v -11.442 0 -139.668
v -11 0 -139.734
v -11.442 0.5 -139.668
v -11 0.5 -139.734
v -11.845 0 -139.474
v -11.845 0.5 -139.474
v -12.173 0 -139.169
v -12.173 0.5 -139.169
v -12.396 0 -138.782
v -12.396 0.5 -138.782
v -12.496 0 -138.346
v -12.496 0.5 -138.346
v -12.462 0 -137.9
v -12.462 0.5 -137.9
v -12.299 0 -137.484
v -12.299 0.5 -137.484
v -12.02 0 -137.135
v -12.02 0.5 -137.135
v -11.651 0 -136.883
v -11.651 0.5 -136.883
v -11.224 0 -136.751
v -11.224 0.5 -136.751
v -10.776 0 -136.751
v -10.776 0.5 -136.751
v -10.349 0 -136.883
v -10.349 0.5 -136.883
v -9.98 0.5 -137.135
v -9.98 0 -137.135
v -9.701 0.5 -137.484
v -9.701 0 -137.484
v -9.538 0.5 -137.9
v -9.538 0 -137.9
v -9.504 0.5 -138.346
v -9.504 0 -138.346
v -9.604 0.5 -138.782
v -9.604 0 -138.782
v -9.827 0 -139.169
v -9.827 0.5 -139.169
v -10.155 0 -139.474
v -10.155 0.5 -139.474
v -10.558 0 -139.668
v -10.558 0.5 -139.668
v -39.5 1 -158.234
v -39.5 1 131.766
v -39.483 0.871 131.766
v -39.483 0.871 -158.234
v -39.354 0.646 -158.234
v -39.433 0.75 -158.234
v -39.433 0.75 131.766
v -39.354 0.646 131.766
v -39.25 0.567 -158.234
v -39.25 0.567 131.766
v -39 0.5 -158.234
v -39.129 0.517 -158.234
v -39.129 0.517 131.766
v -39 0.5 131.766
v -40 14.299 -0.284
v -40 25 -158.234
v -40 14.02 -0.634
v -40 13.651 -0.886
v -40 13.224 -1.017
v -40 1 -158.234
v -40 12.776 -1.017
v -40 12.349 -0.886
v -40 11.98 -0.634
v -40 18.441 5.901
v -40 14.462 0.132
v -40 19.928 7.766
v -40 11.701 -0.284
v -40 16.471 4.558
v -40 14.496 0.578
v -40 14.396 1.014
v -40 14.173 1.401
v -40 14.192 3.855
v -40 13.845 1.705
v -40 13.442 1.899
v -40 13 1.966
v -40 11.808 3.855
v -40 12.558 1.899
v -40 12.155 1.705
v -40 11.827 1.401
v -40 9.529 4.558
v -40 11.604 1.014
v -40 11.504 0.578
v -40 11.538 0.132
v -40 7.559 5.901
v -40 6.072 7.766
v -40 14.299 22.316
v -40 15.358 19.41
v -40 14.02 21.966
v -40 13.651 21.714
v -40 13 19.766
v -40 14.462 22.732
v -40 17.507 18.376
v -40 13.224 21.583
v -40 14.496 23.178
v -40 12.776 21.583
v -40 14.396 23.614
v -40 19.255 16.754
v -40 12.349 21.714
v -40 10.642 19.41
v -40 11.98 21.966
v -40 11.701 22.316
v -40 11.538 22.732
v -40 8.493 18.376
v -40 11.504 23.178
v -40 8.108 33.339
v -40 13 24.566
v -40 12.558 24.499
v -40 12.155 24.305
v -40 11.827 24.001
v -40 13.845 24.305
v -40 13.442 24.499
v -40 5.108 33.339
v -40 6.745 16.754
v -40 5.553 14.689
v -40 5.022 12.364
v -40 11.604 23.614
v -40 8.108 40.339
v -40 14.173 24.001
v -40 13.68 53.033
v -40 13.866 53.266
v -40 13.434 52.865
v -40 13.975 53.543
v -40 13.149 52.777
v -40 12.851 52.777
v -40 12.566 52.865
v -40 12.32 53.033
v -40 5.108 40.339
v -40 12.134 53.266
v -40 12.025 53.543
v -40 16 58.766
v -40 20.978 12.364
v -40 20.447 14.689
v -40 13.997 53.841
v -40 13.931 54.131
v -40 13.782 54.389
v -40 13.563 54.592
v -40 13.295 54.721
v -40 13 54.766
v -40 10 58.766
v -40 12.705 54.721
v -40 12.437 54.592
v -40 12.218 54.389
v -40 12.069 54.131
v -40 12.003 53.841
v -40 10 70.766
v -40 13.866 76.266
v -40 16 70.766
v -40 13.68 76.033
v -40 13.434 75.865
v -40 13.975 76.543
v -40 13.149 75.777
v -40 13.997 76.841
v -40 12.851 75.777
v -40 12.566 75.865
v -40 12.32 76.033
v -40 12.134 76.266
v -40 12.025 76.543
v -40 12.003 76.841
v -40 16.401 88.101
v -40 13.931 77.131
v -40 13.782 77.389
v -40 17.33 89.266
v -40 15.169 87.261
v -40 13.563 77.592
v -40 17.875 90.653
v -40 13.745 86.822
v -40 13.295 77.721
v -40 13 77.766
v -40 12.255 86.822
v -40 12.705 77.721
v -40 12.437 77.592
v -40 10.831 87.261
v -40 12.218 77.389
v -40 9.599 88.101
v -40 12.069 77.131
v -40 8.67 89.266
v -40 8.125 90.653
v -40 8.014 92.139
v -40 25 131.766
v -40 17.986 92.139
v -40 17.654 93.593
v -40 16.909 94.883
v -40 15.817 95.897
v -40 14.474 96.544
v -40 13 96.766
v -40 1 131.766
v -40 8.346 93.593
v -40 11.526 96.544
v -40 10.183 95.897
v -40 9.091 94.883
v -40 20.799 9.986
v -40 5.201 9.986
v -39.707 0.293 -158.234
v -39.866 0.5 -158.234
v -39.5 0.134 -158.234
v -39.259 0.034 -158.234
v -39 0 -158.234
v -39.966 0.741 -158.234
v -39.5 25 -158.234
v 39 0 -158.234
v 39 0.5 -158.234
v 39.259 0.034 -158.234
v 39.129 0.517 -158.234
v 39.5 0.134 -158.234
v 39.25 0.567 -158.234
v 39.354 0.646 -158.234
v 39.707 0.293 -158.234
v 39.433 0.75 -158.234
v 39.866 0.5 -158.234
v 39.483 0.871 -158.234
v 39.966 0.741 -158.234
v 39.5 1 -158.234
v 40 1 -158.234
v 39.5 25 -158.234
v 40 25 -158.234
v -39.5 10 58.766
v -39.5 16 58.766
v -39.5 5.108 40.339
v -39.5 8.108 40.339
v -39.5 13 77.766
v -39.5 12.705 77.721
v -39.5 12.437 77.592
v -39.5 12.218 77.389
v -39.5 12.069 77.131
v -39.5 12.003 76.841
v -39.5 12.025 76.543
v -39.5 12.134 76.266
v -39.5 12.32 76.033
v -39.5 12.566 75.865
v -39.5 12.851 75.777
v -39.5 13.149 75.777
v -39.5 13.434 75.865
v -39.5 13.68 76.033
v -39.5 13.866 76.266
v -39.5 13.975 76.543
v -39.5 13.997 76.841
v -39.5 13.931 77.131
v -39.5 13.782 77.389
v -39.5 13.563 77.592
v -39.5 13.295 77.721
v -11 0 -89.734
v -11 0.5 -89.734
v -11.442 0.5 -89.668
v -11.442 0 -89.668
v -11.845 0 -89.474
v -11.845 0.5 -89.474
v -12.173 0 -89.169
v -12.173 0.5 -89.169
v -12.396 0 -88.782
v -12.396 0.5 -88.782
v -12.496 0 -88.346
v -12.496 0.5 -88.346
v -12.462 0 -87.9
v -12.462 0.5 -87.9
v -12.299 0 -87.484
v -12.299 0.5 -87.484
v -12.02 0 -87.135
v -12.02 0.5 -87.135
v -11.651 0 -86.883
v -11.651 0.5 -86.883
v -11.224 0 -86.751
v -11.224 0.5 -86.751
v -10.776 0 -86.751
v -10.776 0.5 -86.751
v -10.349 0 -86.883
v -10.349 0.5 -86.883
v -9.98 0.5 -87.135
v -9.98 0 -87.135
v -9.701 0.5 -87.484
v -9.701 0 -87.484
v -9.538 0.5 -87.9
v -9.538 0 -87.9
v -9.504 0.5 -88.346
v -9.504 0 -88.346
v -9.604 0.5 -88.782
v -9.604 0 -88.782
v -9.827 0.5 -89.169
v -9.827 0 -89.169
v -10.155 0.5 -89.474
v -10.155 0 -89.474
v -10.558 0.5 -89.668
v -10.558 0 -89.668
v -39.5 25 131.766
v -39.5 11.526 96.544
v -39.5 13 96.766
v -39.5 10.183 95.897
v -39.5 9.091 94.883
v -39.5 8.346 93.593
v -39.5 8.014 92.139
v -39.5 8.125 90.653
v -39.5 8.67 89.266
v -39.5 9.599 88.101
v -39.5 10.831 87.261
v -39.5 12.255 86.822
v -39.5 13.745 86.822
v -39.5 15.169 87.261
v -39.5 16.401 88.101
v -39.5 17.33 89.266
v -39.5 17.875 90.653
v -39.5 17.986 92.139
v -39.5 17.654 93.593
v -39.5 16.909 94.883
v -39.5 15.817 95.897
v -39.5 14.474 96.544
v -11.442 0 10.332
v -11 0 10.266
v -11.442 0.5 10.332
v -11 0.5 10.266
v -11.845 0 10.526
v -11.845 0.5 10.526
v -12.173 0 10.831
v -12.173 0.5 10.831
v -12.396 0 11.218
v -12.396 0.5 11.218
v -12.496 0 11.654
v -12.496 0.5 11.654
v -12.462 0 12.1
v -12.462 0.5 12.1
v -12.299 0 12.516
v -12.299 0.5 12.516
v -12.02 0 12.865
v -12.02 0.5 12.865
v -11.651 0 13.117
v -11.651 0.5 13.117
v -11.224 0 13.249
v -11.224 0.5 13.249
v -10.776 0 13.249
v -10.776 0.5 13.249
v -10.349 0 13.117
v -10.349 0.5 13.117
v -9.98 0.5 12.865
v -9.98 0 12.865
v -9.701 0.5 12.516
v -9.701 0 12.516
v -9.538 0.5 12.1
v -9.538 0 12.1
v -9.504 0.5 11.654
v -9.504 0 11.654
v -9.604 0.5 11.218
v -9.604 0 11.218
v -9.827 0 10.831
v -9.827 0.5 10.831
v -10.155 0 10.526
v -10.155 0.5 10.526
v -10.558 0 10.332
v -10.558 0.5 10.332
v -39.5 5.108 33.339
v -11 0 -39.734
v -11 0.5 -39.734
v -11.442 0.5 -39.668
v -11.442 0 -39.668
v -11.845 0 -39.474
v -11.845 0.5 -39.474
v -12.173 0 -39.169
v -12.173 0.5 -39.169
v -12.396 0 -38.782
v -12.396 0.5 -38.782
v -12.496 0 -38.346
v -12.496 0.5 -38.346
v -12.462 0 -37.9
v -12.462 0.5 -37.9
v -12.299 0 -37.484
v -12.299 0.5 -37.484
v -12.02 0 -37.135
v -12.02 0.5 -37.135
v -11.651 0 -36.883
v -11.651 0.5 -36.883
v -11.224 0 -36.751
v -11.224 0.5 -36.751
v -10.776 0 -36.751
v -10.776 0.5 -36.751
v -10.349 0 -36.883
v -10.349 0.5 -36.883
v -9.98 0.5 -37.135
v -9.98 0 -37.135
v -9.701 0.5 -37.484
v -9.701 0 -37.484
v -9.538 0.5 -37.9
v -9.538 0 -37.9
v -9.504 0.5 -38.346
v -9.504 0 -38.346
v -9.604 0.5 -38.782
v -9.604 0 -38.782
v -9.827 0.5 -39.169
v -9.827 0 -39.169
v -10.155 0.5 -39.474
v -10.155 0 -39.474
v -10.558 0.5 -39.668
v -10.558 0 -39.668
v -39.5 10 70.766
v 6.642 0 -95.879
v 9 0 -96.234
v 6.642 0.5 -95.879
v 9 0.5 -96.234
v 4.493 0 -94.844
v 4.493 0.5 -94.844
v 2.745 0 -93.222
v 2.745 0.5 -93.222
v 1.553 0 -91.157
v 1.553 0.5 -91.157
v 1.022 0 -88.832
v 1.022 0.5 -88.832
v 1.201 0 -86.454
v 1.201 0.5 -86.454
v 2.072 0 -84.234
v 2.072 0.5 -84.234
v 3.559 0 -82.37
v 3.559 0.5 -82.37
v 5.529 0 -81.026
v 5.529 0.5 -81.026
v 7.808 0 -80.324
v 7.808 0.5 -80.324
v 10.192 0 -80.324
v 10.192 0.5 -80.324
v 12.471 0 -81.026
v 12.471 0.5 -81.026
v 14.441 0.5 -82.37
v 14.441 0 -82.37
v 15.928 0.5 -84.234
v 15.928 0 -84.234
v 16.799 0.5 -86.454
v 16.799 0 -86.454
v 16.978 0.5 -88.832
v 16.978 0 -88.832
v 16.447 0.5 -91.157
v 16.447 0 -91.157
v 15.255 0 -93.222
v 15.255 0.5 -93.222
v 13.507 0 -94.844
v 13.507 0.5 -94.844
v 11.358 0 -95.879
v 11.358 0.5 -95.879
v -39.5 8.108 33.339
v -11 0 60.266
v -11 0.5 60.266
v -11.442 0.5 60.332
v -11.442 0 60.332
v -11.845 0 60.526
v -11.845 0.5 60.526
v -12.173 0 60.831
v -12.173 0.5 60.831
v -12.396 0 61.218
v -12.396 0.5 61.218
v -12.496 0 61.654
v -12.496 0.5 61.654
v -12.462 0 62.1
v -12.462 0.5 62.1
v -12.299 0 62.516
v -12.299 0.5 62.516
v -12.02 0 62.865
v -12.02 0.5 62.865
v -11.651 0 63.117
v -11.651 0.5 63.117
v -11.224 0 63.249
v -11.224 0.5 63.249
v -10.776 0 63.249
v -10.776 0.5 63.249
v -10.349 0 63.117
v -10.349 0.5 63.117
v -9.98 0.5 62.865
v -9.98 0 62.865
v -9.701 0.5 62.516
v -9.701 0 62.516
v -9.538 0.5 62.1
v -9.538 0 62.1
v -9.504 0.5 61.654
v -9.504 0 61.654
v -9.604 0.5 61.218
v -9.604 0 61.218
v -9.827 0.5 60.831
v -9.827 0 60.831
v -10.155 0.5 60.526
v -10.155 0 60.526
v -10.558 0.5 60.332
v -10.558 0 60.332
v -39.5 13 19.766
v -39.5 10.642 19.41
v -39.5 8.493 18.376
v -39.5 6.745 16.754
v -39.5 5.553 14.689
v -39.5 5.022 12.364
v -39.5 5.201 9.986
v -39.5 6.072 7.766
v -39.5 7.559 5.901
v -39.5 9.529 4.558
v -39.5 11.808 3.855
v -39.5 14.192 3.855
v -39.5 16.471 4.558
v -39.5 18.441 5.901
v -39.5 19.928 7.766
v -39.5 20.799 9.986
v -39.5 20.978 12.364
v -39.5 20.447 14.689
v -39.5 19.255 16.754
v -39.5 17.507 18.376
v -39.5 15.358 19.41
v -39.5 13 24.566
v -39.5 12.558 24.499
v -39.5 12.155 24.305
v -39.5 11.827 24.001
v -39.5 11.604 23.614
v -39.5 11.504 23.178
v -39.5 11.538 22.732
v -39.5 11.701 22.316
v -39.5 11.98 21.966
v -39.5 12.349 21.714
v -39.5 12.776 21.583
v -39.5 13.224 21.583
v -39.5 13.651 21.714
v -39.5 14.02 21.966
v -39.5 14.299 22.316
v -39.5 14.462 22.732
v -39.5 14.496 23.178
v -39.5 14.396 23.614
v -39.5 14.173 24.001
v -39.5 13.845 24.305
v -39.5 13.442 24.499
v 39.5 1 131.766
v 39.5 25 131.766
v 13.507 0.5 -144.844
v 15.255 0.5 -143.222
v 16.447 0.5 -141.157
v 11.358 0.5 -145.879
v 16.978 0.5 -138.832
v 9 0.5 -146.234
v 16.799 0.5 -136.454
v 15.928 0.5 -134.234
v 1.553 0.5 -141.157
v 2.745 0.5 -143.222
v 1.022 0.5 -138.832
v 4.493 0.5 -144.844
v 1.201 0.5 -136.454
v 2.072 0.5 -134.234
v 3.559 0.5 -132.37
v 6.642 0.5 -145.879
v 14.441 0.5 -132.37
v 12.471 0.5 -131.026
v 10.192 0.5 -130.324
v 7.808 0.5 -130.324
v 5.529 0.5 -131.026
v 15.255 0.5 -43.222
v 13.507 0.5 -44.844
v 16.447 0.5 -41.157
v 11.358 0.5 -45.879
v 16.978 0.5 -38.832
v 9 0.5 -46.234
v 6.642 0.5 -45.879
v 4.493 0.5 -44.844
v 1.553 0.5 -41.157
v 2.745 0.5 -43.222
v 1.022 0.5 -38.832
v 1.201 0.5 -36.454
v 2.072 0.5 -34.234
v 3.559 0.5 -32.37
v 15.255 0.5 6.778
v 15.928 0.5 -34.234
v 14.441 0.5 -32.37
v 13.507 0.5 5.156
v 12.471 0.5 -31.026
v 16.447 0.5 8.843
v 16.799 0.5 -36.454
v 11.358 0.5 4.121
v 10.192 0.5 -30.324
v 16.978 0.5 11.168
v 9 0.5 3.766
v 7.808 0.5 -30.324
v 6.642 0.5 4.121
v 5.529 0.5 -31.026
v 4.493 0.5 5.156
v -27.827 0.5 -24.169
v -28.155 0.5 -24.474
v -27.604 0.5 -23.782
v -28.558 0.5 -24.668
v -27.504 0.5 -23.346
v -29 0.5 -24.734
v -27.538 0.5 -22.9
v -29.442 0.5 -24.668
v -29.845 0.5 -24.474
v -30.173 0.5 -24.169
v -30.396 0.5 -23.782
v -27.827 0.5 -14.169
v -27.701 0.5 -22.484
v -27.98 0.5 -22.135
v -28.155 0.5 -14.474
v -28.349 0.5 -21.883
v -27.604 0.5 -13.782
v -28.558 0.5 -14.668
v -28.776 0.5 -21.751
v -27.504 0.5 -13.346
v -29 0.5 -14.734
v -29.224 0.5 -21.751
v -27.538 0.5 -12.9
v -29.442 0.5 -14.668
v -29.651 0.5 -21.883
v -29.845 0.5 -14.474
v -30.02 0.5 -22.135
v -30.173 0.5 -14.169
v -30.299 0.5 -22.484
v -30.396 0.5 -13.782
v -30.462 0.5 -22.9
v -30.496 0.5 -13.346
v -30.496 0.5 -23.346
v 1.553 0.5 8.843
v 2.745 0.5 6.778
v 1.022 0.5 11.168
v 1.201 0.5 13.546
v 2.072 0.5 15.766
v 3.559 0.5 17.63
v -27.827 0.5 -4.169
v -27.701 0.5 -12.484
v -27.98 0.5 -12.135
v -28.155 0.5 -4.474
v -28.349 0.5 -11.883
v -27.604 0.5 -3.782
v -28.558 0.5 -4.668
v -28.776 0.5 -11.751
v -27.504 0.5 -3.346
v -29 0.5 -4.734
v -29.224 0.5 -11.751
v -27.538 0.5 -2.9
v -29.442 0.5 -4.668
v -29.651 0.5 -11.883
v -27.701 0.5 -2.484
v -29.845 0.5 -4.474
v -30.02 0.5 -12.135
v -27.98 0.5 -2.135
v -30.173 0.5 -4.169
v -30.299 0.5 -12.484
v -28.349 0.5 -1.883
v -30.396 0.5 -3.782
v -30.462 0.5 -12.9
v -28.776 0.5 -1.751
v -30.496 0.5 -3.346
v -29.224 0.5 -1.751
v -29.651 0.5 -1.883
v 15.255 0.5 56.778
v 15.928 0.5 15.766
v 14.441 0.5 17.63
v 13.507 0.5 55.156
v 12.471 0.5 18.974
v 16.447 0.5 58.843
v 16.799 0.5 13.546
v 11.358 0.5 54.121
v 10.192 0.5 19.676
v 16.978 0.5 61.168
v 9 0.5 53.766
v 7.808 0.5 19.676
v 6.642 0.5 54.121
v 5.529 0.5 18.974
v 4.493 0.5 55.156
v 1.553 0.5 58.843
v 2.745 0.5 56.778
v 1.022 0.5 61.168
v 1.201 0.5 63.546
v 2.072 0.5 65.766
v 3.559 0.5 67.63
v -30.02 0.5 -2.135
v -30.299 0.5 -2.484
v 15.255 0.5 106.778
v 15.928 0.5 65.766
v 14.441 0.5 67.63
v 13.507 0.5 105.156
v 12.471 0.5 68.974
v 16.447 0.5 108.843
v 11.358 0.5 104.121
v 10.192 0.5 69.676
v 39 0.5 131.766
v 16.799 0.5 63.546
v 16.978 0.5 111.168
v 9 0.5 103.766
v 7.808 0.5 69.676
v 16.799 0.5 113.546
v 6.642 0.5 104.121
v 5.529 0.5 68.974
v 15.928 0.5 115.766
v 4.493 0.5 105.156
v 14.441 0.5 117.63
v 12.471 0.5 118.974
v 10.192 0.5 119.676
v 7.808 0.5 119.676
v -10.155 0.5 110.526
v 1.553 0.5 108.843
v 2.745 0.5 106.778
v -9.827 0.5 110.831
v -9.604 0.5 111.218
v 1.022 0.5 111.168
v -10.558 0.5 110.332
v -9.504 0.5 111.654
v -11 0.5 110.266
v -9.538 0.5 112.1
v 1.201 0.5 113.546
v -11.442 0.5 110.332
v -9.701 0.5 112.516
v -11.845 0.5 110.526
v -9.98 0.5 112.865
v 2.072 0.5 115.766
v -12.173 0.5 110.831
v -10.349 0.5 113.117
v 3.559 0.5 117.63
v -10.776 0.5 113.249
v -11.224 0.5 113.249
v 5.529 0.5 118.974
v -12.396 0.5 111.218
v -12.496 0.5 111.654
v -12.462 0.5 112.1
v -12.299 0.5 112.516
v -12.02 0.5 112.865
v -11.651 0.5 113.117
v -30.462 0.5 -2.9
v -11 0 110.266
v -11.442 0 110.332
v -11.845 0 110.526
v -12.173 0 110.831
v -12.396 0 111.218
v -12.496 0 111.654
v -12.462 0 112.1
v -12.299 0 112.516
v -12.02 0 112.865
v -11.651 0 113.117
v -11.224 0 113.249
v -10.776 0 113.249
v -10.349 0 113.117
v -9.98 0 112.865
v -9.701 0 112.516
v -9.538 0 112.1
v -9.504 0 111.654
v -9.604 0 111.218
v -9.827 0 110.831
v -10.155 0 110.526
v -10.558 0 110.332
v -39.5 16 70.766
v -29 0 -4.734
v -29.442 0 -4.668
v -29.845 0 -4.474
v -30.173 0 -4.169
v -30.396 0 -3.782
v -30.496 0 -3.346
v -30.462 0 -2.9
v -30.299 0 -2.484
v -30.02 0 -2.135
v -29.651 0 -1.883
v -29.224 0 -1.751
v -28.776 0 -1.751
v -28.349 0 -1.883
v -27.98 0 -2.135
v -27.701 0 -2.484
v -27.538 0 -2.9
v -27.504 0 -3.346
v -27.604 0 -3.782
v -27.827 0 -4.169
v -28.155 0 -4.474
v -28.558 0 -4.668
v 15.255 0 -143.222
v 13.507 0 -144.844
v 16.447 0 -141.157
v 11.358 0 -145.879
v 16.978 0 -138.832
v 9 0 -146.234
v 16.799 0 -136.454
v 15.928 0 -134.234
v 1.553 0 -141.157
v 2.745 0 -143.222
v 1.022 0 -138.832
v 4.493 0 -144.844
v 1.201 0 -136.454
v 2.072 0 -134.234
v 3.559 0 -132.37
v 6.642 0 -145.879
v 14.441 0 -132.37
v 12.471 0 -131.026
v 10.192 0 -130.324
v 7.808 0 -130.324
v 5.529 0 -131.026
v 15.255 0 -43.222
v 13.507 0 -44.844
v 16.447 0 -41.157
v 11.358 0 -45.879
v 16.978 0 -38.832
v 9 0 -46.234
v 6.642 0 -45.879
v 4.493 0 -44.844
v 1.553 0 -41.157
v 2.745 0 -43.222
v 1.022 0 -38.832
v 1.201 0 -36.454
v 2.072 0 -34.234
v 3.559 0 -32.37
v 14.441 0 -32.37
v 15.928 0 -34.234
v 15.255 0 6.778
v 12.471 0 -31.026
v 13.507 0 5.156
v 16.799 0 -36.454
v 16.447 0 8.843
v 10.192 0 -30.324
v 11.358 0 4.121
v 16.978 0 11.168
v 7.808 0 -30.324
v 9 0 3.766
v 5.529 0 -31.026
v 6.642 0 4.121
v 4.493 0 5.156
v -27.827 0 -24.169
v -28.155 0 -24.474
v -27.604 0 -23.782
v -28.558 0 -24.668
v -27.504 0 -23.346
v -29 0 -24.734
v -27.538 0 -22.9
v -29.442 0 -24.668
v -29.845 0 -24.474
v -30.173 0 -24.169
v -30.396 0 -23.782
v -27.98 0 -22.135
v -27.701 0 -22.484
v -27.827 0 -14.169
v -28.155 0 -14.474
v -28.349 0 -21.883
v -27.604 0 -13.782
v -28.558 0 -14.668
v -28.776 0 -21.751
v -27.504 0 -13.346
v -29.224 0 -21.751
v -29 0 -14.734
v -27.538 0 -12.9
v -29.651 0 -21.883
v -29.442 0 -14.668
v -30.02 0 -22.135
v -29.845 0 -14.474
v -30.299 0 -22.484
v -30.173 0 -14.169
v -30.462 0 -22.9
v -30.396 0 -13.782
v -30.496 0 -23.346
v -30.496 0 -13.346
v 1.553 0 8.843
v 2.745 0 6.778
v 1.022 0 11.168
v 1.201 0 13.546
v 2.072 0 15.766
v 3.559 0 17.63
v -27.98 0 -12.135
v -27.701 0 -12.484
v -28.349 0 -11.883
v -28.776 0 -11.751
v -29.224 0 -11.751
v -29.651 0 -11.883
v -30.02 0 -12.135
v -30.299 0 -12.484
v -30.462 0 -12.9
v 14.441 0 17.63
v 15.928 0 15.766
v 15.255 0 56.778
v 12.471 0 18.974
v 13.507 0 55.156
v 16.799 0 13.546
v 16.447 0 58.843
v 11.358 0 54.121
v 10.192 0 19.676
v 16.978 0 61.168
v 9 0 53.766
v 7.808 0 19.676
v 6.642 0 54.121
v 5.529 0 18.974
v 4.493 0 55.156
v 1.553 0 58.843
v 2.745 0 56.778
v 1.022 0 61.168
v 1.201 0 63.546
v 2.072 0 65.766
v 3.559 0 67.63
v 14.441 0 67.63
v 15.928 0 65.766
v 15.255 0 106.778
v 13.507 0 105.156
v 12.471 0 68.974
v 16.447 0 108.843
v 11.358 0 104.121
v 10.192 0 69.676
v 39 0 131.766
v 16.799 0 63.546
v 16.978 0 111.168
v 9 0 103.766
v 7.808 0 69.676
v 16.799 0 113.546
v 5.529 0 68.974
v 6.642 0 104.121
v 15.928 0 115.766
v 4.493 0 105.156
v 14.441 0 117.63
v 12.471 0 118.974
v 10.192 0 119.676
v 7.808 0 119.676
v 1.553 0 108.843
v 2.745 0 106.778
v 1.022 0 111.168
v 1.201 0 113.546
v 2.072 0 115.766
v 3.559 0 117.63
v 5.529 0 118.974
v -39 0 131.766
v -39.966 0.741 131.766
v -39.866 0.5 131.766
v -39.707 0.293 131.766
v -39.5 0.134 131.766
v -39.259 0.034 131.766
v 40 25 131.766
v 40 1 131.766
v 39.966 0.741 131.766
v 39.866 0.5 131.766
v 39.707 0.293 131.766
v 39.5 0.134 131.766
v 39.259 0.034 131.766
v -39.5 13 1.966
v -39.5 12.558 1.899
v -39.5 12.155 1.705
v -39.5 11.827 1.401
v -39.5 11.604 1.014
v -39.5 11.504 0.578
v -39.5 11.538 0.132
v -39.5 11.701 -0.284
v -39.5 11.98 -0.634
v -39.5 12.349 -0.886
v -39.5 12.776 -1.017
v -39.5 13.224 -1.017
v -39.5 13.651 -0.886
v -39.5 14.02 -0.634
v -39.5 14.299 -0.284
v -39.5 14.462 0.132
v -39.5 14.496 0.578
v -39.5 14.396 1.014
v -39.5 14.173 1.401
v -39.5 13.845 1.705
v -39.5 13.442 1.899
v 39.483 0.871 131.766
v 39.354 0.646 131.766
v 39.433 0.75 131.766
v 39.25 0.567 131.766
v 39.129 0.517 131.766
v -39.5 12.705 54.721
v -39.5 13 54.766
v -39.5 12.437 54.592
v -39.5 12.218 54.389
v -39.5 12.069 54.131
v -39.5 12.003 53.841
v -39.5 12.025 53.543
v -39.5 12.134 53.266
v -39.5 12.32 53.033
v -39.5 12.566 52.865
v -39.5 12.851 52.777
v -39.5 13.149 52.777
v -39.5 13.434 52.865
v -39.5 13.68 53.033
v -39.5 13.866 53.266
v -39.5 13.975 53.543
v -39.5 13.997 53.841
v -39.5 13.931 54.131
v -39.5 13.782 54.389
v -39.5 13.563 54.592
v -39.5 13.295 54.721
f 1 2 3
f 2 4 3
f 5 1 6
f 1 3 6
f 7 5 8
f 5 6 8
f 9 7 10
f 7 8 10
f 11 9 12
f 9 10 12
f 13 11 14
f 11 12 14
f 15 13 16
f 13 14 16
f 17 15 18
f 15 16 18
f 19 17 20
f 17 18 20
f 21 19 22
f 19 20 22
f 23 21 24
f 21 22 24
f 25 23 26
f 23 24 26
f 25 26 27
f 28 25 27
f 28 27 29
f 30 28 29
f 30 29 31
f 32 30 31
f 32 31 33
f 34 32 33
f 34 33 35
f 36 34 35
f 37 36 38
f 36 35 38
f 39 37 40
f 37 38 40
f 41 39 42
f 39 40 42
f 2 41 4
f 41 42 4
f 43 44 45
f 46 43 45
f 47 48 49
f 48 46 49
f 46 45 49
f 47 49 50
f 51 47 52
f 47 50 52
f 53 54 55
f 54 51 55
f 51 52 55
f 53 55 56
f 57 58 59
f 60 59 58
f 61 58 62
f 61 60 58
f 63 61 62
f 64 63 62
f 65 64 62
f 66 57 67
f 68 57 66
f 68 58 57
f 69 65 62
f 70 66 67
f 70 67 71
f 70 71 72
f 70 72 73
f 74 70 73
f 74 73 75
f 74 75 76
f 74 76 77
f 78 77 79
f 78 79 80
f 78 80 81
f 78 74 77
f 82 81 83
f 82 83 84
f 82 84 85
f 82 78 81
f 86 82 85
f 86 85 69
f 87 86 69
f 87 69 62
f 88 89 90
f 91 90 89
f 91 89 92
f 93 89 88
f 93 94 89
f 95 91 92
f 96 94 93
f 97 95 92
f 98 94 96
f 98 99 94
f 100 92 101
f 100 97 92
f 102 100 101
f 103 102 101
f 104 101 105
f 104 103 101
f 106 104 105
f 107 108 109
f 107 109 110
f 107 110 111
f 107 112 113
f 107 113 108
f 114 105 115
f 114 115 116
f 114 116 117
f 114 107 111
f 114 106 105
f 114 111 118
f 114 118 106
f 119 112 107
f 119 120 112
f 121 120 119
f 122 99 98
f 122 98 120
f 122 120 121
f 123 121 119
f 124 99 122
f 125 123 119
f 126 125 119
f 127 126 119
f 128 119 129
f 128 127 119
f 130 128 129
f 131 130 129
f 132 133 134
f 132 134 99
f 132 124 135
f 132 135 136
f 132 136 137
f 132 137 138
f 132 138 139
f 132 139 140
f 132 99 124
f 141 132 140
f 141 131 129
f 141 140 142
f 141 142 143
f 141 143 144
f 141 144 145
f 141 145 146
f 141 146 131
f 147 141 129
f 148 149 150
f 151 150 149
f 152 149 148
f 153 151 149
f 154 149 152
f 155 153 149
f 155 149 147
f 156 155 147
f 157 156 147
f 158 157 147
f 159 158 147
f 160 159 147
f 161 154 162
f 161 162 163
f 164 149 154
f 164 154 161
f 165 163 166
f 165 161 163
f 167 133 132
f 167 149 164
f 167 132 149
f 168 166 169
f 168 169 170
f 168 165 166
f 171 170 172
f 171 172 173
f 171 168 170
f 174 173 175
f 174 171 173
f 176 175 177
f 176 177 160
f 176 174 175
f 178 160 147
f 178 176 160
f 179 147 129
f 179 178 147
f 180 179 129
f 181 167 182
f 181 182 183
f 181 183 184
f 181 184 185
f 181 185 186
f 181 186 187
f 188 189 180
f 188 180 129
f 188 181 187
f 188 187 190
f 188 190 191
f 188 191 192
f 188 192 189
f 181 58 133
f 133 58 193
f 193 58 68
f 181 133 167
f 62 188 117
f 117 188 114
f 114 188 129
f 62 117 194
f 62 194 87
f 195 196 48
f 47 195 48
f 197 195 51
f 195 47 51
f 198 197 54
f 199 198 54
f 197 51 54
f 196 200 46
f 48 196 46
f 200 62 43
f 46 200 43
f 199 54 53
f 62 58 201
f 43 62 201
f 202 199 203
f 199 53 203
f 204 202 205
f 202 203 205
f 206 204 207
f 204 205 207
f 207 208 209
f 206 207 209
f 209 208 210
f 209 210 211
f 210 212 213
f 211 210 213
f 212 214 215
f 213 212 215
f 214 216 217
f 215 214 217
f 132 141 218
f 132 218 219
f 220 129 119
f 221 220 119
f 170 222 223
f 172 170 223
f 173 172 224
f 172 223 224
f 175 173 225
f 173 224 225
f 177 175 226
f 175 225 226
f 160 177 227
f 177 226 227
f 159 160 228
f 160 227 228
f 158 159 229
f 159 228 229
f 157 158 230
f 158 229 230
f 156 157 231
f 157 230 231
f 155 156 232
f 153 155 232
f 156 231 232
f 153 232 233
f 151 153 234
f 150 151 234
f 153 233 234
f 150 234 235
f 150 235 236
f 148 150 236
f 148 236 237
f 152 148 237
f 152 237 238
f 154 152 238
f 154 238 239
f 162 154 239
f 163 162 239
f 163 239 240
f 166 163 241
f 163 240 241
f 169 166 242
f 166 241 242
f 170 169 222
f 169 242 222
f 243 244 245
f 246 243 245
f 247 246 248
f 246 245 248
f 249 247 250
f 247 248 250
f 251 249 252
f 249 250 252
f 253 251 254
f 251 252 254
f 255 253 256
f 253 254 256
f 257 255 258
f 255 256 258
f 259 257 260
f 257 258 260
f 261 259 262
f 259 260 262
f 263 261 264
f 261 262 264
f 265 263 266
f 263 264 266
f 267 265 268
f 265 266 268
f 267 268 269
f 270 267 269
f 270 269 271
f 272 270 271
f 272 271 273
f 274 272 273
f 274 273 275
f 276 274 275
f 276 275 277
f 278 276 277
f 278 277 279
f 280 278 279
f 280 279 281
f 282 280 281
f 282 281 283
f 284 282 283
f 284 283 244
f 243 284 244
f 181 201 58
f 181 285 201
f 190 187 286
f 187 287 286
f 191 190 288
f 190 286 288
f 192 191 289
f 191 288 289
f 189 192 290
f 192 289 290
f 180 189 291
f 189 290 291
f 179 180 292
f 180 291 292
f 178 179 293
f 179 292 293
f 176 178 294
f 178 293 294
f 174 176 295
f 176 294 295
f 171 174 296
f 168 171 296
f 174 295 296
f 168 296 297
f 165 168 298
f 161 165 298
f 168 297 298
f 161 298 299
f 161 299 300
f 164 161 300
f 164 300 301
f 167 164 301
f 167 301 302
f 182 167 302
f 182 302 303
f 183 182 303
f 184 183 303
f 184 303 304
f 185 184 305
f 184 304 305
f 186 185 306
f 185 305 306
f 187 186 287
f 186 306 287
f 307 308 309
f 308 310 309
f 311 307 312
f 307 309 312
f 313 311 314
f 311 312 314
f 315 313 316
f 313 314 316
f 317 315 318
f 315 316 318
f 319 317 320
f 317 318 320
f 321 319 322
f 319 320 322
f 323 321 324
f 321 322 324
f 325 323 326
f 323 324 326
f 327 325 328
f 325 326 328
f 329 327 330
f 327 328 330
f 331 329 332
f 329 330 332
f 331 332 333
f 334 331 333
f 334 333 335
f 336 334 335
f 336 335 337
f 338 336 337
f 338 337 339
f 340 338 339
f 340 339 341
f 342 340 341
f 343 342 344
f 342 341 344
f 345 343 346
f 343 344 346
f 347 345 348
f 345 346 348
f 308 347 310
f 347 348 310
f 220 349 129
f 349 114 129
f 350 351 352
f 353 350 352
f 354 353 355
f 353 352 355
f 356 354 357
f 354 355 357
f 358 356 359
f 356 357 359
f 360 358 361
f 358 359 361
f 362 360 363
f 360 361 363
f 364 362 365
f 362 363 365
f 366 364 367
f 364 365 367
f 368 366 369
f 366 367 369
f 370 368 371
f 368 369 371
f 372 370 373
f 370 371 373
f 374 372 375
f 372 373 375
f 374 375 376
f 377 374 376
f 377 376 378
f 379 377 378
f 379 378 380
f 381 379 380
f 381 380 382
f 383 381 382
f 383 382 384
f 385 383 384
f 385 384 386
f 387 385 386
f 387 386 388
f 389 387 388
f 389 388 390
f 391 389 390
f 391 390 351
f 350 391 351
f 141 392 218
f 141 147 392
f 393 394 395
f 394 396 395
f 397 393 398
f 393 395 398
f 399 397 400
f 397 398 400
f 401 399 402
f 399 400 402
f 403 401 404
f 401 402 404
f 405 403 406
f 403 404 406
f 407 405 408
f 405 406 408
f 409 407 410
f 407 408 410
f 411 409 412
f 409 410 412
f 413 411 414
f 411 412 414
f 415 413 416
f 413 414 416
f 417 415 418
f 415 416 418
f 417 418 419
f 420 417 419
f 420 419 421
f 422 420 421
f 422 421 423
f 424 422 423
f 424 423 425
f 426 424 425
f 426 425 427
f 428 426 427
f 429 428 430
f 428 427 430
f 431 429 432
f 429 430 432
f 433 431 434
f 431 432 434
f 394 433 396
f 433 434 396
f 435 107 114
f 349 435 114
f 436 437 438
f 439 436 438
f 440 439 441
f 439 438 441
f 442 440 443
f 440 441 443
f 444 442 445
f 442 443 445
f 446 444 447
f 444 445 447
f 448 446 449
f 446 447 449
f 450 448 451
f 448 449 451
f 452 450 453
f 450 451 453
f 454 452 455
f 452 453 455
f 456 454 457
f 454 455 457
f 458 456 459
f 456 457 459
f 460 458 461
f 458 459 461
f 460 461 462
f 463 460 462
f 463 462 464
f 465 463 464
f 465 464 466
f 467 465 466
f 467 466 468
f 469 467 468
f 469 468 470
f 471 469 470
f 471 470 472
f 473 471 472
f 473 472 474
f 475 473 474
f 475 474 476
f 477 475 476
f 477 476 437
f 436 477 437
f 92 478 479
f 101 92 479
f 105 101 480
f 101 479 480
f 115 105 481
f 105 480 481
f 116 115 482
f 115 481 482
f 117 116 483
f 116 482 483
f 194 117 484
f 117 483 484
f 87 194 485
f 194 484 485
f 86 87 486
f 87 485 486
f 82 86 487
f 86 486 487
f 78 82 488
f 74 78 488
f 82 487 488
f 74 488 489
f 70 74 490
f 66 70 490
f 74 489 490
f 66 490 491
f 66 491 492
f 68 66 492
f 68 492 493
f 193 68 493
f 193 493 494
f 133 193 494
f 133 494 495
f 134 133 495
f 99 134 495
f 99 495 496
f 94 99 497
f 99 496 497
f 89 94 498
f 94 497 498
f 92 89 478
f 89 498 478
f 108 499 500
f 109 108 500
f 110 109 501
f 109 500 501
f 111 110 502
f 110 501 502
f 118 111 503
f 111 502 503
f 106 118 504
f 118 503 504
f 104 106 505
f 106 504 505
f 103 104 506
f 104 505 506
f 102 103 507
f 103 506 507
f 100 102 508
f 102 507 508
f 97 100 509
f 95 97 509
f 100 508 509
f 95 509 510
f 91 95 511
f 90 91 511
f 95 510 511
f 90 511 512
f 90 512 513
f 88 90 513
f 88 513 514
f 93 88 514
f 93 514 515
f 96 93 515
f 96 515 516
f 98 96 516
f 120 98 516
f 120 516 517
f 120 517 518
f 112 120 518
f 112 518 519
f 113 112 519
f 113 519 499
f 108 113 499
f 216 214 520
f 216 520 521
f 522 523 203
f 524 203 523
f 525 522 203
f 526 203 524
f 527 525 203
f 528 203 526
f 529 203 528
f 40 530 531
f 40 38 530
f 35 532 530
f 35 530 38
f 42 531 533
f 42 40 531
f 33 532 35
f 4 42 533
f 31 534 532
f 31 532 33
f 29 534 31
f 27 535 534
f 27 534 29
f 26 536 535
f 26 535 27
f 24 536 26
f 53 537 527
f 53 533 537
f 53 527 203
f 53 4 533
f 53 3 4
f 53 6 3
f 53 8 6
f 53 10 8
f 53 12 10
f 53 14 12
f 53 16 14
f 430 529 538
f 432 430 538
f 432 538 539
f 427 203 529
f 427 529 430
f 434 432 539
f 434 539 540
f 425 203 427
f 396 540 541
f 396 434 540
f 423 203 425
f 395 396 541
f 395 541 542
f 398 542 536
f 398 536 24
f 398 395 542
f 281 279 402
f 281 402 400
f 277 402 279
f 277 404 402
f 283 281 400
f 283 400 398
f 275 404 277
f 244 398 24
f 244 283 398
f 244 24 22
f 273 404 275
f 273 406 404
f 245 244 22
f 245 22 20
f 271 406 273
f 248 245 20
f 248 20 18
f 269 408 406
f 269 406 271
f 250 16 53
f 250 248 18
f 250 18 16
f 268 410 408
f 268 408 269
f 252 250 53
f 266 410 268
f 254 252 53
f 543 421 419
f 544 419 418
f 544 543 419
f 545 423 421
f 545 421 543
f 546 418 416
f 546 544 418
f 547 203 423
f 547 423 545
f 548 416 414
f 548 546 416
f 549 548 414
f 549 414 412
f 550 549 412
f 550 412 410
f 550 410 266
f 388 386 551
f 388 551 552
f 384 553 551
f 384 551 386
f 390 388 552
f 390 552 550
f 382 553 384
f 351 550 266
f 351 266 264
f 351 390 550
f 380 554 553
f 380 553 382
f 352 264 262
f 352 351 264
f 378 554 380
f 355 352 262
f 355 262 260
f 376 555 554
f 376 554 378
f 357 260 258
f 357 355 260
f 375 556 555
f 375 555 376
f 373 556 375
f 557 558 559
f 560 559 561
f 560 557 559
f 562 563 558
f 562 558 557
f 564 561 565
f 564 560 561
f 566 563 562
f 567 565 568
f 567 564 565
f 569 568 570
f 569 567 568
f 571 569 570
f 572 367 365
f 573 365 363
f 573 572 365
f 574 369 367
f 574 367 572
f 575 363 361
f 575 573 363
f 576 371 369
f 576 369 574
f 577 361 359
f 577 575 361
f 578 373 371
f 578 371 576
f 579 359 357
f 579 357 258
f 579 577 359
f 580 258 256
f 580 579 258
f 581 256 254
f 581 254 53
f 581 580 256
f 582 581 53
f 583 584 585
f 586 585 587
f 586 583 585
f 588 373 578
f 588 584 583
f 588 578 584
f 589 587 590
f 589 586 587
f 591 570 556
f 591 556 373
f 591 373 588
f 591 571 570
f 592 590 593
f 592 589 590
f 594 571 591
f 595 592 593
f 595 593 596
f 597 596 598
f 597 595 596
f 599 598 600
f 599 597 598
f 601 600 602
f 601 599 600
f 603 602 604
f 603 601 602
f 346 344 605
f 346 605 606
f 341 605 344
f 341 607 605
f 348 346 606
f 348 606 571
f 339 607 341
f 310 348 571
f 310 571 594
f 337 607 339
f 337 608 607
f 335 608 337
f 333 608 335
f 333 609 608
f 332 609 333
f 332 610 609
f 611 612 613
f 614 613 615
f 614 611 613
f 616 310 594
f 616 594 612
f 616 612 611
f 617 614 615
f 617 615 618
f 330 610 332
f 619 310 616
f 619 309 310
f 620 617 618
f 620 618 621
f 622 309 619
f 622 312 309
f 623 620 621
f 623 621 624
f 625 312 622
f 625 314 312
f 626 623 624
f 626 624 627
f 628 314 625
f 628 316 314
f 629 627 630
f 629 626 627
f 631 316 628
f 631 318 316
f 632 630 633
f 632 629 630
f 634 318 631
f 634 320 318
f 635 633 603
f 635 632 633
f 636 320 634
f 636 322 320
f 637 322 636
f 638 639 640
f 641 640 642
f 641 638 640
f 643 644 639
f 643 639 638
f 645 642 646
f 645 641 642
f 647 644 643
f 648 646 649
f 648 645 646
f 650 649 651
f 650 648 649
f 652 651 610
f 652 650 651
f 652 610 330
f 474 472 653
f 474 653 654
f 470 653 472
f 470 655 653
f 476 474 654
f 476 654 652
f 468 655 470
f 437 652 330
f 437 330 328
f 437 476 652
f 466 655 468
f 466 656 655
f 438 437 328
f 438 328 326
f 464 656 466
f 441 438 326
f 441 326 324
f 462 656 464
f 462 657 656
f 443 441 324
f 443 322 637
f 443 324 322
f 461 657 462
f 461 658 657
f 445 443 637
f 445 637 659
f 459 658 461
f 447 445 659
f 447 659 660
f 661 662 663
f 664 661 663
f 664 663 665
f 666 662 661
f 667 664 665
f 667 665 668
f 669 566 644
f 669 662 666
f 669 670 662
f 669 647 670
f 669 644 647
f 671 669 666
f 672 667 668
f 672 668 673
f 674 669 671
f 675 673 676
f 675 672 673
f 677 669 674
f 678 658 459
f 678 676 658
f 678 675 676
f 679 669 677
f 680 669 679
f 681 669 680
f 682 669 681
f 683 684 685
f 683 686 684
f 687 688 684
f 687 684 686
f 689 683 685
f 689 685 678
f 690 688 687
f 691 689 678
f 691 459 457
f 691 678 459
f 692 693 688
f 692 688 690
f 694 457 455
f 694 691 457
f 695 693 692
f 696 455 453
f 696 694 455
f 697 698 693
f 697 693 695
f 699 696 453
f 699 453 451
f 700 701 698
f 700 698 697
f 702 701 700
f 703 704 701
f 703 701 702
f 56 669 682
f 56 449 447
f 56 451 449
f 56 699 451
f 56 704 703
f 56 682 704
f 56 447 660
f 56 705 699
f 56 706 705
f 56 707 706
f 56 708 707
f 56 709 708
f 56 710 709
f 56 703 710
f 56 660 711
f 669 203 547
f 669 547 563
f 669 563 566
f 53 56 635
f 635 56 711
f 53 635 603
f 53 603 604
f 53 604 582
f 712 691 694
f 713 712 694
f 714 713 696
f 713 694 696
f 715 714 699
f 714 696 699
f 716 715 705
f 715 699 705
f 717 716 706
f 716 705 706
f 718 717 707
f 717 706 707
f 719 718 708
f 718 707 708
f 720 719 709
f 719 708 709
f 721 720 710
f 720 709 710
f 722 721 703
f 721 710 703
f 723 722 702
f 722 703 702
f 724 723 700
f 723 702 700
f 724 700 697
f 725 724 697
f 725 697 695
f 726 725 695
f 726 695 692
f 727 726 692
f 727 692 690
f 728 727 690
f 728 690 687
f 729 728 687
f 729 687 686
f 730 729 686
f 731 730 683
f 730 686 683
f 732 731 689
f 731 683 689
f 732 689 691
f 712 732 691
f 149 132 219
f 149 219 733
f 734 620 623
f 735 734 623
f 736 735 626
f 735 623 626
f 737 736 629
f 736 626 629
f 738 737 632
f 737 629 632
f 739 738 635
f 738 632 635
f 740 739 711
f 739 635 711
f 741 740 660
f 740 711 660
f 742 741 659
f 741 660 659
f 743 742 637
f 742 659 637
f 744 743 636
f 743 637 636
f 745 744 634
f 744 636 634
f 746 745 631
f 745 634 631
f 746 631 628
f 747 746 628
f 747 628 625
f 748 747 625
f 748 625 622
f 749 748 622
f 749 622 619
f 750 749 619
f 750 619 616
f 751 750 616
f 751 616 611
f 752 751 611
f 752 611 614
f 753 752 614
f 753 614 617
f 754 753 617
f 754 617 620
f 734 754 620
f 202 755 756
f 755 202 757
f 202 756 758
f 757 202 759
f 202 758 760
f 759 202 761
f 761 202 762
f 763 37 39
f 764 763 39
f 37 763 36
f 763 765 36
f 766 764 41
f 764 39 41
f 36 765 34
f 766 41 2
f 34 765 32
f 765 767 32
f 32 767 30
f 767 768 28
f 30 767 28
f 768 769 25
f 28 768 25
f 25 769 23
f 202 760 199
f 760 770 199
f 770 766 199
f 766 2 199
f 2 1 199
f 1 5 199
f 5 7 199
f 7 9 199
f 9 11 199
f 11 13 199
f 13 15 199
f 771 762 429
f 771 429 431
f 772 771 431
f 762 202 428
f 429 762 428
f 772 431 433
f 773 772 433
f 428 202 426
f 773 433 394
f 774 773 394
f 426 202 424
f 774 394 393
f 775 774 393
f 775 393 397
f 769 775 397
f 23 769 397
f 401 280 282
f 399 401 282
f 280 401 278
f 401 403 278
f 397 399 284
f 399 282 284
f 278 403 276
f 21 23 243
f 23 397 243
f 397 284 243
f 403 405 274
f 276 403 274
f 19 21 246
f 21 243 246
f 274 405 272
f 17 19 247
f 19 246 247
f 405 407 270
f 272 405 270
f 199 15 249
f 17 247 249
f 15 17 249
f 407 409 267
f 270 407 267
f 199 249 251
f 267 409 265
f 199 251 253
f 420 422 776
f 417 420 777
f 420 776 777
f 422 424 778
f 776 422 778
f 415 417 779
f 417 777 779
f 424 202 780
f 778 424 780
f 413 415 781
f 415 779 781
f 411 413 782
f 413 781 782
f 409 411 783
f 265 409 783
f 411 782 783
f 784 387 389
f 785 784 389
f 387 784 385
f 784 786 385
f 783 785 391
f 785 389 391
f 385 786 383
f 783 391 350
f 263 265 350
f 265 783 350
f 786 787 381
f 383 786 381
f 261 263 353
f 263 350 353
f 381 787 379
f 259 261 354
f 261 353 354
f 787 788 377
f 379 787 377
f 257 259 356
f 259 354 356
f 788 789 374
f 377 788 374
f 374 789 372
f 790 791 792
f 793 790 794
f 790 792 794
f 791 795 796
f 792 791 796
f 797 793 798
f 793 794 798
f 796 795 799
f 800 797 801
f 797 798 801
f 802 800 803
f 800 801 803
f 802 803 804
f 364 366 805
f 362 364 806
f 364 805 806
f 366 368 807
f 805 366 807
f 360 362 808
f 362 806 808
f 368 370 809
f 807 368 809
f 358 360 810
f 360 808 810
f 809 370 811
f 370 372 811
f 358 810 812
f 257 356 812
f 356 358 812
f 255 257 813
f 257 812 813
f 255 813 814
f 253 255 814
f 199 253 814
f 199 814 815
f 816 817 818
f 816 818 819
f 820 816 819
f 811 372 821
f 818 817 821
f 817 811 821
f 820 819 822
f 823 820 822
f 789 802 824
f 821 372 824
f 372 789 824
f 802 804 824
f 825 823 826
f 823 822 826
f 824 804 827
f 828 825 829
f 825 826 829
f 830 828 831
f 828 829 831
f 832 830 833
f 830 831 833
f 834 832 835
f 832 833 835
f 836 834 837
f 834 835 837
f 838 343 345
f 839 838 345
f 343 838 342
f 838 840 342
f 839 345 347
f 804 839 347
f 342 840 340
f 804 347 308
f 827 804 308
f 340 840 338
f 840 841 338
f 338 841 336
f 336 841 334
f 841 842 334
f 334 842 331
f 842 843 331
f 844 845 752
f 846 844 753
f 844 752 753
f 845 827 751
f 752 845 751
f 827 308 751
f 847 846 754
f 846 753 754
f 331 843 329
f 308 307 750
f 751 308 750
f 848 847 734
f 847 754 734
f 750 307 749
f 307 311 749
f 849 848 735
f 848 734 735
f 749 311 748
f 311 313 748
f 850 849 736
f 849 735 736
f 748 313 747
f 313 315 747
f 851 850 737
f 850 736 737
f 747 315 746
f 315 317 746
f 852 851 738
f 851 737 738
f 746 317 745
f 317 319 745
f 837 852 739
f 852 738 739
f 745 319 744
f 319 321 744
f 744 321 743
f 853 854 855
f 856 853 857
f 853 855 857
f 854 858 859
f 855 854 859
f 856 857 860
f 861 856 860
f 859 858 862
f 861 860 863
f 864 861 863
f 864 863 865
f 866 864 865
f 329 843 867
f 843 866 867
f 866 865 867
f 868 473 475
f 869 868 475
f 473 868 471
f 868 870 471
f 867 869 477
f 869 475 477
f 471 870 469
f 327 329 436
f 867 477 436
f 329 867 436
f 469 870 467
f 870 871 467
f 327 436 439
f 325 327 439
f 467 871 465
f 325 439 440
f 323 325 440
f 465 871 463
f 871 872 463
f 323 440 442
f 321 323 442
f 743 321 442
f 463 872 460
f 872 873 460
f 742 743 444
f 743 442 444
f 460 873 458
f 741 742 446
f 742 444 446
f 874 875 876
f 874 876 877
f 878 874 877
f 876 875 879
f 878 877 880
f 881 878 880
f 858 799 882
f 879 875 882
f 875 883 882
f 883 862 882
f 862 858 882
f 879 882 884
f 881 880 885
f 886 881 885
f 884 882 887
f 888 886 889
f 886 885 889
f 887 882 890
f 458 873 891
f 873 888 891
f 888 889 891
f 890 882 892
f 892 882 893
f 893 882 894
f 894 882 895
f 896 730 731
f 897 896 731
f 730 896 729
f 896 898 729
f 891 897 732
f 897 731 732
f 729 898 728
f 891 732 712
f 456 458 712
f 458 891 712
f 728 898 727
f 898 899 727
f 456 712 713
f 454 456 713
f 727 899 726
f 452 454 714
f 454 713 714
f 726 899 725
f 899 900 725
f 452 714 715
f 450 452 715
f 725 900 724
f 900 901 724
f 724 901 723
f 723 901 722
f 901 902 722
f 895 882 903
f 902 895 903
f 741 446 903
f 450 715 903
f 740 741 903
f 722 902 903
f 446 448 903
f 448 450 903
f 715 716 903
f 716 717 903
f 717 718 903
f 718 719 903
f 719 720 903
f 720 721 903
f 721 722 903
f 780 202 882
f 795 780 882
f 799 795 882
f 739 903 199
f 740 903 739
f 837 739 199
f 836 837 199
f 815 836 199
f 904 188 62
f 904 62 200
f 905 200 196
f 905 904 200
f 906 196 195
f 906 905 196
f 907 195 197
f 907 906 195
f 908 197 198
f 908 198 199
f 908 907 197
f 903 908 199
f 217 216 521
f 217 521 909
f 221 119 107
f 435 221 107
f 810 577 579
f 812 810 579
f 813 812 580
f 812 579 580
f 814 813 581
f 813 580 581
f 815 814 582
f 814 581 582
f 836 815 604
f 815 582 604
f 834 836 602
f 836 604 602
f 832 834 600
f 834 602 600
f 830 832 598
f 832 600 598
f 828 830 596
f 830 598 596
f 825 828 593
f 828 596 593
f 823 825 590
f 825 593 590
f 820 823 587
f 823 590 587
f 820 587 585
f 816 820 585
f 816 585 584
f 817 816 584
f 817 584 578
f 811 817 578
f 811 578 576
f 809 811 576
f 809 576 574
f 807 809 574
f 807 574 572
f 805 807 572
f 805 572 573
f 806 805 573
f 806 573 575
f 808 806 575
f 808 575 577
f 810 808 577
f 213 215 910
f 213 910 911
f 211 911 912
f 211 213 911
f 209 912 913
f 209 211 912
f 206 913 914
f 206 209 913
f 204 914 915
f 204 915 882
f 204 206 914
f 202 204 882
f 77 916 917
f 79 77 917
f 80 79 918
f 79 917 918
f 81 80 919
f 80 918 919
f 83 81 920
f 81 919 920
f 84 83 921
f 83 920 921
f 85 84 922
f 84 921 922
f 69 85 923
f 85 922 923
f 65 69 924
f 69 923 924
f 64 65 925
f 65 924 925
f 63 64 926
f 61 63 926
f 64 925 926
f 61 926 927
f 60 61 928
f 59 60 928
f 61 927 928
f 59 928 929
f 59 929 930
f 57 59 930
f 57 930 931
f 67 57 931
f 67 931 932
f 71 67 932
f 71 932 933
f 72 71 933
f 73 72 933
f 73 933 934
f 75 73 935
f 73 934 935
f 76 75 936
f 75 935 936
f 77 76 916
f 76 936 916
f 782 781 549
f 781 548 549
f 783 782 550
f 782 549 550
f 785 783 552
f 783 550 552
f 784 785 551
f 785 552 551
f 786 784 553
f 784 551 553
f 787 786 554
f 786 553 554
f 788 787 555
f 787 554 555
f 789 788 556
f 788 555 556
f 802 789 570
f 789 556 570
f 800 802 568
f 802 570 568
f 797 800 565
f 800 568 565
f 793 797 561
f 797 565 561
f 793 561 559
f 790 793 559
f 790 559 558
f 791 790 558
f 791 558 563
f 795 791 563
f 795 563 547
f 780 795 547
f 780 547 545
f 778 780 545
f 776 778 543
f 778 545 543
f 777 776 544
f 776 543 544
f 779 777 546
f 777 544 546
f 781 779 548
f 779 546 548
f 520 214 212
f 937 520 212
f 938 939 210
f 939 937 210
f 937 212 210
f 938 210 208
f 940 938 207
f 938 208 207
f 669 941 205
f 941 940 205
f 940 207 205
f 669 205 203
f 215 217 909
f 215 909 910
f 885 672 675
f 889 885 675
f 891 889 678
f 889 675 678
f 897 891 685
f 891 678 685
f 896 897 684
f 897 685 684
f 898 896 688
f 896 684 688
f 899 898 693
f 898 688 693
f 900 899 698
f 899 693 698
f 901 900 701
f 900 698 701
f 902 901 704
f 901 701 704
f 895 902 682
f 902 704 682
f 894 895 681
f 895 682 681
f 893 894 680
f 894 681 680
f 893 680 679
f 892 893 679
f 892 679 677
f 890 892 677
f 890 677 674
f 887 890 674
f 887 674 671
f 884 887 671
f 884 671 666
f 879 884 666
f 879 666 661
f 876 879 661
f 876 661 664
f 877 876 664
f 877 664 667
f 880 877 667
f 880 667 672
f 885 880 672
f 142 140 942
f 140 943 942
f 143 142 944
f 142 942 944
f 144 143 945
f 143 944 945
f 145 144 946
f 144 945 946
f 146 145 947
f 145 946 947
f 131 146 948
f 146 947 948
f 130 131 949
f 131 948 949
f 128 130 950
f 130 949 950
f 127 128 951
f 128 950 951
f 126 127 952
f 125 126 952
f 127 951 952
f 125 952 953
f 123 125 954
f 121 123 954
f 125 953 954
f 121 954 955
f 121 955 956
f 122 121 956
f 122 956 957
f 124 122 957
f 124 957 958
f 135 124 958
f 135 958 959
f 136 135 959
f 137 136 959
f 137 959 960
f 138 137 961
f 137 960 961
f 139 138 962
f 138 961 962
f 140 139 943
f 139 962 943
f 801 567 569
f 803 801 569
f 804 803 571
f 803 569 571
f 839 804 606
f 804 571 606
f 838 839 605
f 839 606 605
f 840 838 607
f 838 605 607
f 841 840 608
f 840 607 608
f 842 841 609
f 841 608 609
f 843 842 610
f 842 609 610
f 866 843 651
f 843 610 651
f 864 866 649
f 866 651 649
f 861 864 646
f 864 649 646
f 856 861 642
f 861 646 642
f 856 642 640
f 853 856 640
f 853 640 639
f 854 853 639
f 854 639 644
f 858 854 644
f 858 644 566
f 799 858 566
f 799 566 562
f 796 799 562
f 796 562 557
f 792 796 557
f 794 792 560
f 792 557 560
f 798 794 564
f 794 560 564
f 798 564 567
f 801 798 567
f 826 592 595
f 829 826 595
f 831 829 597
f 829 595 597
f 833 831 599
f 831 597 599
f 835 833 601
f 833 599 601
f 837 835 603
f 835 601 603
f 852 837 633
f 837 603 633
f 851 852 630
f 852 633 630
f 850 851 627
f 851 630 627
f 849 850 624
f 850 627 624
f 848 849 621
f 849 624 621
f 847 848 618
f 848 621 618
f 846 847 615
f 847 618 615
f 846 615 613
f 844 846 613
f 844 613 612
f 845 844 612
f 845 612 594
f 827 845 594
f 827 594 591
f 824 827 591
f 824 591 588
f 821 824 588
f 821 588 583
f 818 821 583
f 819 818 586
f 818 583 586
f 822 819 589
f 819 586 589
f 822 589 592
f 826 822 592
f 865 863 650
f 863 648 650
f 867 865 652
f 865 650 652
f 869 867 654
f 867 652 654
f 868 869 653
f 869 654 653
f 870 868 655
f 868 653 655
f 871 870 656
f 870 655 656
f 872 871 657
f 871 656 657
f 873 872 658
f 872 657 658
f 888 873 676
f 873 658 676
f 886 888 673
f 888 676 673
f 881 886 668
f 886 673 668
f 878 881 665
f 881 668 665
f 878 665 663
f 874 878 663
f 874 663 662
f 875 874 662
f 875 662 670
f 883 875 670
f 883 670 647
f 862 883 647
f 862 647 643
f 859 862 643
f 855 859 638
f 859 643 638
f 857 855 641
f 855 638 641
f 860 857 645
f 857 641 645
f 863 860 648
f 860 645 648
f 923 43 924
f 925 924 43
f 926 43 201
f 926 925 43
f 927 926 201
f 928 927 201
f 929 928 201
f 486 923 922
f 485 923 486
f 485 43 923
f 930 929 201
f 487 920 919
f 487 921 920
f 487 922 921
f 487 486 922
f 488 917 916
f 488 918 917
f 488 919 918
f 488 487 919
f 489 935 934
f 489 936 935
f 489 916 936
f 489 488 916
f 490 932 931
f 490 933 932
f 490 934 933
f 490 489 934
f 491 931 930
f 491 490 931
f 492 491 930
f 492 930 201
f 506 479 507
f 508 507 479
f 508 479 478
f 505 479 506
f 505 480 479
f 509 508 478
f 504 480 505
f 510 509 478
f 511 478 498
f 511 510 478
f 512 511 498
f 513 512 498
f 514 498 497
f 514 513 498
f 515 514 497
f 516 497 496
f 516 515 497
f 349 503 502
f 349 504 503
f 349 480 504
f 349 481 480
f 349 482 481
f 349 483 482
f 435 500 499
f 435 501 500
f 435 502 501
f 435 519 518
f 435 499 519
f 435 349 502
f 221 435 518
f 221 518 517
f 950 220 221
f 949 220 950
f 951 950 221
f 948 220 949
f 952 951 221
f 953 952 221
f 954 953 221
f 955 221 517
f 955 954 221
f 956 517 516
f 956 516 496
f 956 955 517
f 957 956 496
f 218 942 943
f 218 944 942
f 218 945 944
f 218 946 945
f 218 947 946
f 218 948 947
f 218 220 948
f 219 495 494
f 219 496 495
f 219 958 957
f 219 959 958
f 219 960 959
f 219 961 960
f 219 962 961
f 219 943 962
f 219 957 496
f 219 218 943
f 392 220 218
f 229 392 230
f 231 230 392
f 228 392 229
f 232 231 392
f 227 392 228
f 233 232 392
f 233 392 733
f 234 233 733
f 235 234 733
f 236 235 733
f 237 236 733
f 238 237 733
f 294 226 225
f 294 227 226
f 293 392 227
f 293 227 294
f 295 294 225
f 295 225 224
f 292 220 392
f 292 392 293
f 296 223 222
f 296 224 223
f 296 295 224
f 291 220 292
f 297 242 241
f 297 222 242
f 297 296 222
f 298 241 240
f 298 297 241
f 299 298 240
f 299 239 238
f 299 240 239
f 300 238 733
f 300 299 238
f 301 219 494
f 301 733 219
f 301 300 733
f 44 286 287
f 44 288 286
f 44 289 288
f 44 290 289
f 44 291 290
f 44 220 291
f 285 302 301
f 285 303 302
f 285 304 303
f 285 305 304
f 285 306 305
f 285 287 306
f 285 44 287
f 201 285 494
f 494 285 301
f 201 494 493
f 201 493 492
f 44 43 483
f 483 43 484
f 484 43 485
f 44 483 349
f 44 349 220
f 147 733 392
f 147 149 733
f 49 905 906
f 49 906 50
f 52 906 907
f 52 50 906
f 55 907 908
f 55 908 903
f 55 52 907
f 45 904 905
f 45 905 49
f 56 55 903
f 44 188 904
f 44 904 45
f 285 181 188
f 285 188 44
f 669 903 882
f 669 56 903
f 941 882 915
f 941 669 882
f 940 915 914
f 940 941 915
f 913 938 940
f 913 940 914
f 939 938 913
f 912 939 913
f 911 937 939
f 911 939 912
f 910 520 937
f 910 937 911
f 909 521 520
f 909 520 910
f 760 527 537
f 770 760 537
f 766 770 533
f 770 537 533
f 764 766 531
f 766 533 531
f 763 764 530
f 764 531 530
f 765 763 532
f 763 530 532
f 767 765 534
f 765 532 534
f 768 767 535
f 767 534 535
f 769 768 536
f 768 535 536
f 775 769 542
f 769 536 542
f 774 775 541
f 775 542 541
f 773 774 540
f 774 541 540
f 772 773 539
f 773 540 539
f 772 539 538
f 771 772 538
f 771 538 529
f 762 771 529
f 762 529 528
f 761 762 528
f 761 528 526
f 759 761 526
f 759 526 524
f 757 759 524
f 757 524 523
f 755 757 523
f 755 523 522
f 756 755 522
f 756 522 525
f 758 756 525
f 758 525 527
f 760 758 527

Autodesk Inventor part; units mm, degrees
ref_plane "YZ Plane" through (0, 0, 0) normal (1, 0, 0) x (0, 1, 0)
ref_plane "XZ Plane" through (0, 0, 0) normal (0, 1, 0) x (-1, 0, 0)
ref_plane "XY Plane" through (0, 0, 0) normal (0, 0, 1) x (1, 0, 0)
sketch "Sketch1" plane through (0, 0, 0) normal (0, 1, 0) x (-1, 0, 0)
  line L0 (40, 131.7658) -> (-40, 131.7658)
  line L1 (-40, 131.7658) -> (-40, -158.2342)
  line L2 (-40, -158.2342) -> (40, -158.2342)
  line L3 (40, -158.2342) -> (40, 131.7658)
  point P0 (0, 0)
  dimension "d0" = 80
  dimension "d1" = 290
extrude "Plate1" add sketch "Sketch1" along normal blind 0.5
sketch "Sketch2" plane through (39.5, 0, -158.2342) normal (1, 0, 0) x (0, 1, 0)
  line L0 (0, 290) -> (0, 0)
  line L1 (0, 0) -> (25, 0)
  line L2 (25, 0) -> (25, 290)
  line L3 (25, 290) -> (0, 290)
edge flange "Flange1" height 25 angle 90 thickness 0.5 bend radius 0.5 thickness toward (1, 0, 0) relief tear relief width 0.5 relief depth 0.25 edges at (40, 0.5, -13.2342) wall of the first edge with corners at (39.5, 0, 131.7658) (39.5, 0, -158.2342) (39.5, 25, -158.2342) (39.5, 25, 131.7658)
bend "Bend1"
corner "Corner1"
sketch "Sketch3" plane through (-39.5, 0, 131.7658) normal (-1, 0, 0) x (0, -1, 0)
  line L0 (0, -290) -> (0, 0)
  line L1 (0, 0) -> (-25, 0)
  line L2 (-25, 0) -> (-25, -290)
  line L3 (-25, -290) -> (0, -290)
edge flange "Flange2" height 25 angle 90 thickness 0.5 bend radius 0.5 thickness toward (-1, 0, 0) relief tear relief width 0.5 relief depth 0.25 edges at (-40, 0.5, -13.2342) wall of the first edge with corners at (-39.5, 0, -158.2342) (-39.5, 0, 131.7658) (-39.5, 25, 131.7658) (-39.5, 25, -158.2342)
bend "Bend2"
corner "Corner2"
hole "Hole1" at (9, 0, -138.2342) direction (0, 1, 0) diameter 16 depth 0.5 tip angle 118
hole "Hole2" at (9, 0, -88.2342) direction (0, 1, 0) diameter 16 depth 0.5 tip angle 118
hole "Hole3" at (9, 0, -38.2342) direction (0, 1, 0) diameter 16 depth 0.5 tip angle 118
hole "Hole4" at (9, 0, 11.7658) direction (0, 1, 0) diameter 16 depth 0.5 tip angle 118
hole "Hole5" at (9, 0, 61.7658) direction (0, 1, 0) diameter 16 depth 0.5 tip angle 118
hole "Hole6" at (9, 0, 111.7658) direction (0, 1, 0) diameter 16 depth 0.5 tip angle 118
hole "Hole7" at (-11, 0, -138.2342) direction (0, 1, 0) diameter 3 depth 0.5 tip angle 118
hole "Hole8" at (-11, 0, -88.2342) direction (0, 1, 0) diameter 3 depth 0.5 tip angle 118
hole "Hole9" at (-11, 0, -38.2342) direction (0, 1, 0) diameter 3 depth 0.5 tip angle 118
hole "Hole10" at (-11, 0, 11.7658) direction (0, 1, 0) diameter 3 depth 0.5 tip angle 118
hole "Hole11" at (-11, 0, 61.7658) direction (0, 1, 0) diameter 3 depth 0.5 tip angle 118
hole "Hole12" at (-11, 0, 111.7658) direction (0, 1, 0) diameter 3 depth 0.5 tip angle 118
hole "Hole13" at (-29, 0, -13.2342) direction (0, 1, 0) diameter 3 depth 0.5 tip angle 118
hole "Hole14" at (-29, 0, -23.2342) direction (0, 1, 0) diameter 3 depth 0.5 tip angle 118
hole "Hole15" at (-29, 0, -3.2342) direction (0, 1, 0) diameter 3 depth 0.5 tip angle 118
hole "Hole16" at (-40, 13, 91.7658) direction (1, 0, 0) diameter 10 depth 0.5 tip angle 118
hole "Hole17" at (-40, 13, 76.7658) direction (1, 0, 0) diameter 2 depth 0.5 tip angle 118
hole "Hole18" at (-40, 13, 53.7658) direction (1, 0, 0) diameter 2 depth 0.5 tip angle 118
sketch "Sketch4" plane through (-40, 25, -158.2342) normal (-1, 0, 0) x (0, 0, 1)
  line L0 (229, -15) -> (217, -15)
  line L1 (217, -15) -> (217, -9)
  line L2 (217, -9) -> (229, -9)
  line L3 (229, -9) -> (229, -15)
  line L4 (290, 0) -> (290, -24) projected
  point P0 (158.2342, -25)
  dimension "d185" = 61
  dimension "d186" = 73
extrude "Cut1" cut sketch "Sketch4" against normal blind 0.5
sketch "Sketch5" plane through (-40, 25, -158.2342) normal (-1, 0, 0) x (0, 0, 1)
  line L0 (198.5735, -16.892) -> (191.5735, -16.892)
  line L1 (191.5735, -16.892) -> (191.5735, -19.892)
  line L2 (191.5735, -19.892) -> (198.5735, -19.892)
  line L3 (198.5735, -19.892) -> (198.5735, -16.892)
  point P0 (158.2342, -25)
  dimension "d189" = 3
  dimension "d190" = 7
extrude "Cut2" cut sketch "Sketch5" against normal blind 0.5
hole "Hole19" at (-40, 13, 11.7658) direction (1, 0, 0) diameter 16 depth 0.5 tip angle 118
hole "Hole20" at (-40, 13, 23.0658) direction (1, 0, 0) diameter 3 depth 0.5 tip angle 118
hole "Hole21" at (-40, 13, 0.4658) direction (1, 0, 0) diameter 3 depth 0.5 tip angle 118
equation "\"d30\" = Thickness"
equation "\"d39\" = Thickness"
equation "\"d48\" = Thickness"
equation "\"d57\" = Thickness"
equation "\"d66\" = Thickness"
equation "\"d75\" = Thickness"
equation "\"d84\" = Thickness"
equation "\"d93\" = Thickness"
equation "\"d102\" = Thickness"
equation "\"d111\" = Thickness"
equation "\"d120\" = Thickness"
equation "\"d129\" = Thickness"
equation "\"d138\" = Thickness"
equation "\"d147\" = Thickness"
equation "\"d156\" = Thickness"
equation "\"d165\" = Thickness"
equation "\"d174\" = Thickness"
equation "\"d183\" = Thickness"
equation "\"d187\" = Thickness"
equation "\"d191\" = Thickness"
equation "\"d200\" = Thickness"
equation "\"d209\" = Thickness"
equation "\"d219\" = Thickness"
equation "\"d3\" = BendReliefWidth"
equation "\"d4\" = BendReliefDepth"
equation "\"d5\" = MinimumRemnant"
equation "\"d6\" = BendRadius"
equation "\"d9\" = BendRadius"
equation "\"d10\" = CornerReliefSize"
equation "\"d11\" = GapSize"
equation "\"d12\" = JacobiRadiusSize"
equation "\"d13\" = BendReliefWidth"
equation "\"d14\" = BendReliefDepth"
equation "\"d15\" = MinimumRemnant"
equation "\"d16\" = BendRadius"
equation "\"d19\" = BendRadius"
equation "\"d20\" = CornerReliefSize"
equation "\"d21\" = GapSize"
equation "\"d22\" = JacobiRadiusSize"
equation "\"BendRadius\" = Thickness"
equation "\"BendReliefWidth\" = Thickness"
equation "\"BendReliefDepth\" = 0.5 * Thickness"
equation "\"CornerReliefSize\" = 4 * Thickness"
equation "\"MinimumRemnant\" = 2 * Thickness"
equation "\"TransitionRadius\" = BendRadius"
equation "\"JacobiRadiusSize\" = BendRadius"
equation "\"GapSize\" = Thickness"
equation "\"d2\" = BendRadius"
equation "\"Thickness\" = 0.5"
properties part number "obudowa nowa"
